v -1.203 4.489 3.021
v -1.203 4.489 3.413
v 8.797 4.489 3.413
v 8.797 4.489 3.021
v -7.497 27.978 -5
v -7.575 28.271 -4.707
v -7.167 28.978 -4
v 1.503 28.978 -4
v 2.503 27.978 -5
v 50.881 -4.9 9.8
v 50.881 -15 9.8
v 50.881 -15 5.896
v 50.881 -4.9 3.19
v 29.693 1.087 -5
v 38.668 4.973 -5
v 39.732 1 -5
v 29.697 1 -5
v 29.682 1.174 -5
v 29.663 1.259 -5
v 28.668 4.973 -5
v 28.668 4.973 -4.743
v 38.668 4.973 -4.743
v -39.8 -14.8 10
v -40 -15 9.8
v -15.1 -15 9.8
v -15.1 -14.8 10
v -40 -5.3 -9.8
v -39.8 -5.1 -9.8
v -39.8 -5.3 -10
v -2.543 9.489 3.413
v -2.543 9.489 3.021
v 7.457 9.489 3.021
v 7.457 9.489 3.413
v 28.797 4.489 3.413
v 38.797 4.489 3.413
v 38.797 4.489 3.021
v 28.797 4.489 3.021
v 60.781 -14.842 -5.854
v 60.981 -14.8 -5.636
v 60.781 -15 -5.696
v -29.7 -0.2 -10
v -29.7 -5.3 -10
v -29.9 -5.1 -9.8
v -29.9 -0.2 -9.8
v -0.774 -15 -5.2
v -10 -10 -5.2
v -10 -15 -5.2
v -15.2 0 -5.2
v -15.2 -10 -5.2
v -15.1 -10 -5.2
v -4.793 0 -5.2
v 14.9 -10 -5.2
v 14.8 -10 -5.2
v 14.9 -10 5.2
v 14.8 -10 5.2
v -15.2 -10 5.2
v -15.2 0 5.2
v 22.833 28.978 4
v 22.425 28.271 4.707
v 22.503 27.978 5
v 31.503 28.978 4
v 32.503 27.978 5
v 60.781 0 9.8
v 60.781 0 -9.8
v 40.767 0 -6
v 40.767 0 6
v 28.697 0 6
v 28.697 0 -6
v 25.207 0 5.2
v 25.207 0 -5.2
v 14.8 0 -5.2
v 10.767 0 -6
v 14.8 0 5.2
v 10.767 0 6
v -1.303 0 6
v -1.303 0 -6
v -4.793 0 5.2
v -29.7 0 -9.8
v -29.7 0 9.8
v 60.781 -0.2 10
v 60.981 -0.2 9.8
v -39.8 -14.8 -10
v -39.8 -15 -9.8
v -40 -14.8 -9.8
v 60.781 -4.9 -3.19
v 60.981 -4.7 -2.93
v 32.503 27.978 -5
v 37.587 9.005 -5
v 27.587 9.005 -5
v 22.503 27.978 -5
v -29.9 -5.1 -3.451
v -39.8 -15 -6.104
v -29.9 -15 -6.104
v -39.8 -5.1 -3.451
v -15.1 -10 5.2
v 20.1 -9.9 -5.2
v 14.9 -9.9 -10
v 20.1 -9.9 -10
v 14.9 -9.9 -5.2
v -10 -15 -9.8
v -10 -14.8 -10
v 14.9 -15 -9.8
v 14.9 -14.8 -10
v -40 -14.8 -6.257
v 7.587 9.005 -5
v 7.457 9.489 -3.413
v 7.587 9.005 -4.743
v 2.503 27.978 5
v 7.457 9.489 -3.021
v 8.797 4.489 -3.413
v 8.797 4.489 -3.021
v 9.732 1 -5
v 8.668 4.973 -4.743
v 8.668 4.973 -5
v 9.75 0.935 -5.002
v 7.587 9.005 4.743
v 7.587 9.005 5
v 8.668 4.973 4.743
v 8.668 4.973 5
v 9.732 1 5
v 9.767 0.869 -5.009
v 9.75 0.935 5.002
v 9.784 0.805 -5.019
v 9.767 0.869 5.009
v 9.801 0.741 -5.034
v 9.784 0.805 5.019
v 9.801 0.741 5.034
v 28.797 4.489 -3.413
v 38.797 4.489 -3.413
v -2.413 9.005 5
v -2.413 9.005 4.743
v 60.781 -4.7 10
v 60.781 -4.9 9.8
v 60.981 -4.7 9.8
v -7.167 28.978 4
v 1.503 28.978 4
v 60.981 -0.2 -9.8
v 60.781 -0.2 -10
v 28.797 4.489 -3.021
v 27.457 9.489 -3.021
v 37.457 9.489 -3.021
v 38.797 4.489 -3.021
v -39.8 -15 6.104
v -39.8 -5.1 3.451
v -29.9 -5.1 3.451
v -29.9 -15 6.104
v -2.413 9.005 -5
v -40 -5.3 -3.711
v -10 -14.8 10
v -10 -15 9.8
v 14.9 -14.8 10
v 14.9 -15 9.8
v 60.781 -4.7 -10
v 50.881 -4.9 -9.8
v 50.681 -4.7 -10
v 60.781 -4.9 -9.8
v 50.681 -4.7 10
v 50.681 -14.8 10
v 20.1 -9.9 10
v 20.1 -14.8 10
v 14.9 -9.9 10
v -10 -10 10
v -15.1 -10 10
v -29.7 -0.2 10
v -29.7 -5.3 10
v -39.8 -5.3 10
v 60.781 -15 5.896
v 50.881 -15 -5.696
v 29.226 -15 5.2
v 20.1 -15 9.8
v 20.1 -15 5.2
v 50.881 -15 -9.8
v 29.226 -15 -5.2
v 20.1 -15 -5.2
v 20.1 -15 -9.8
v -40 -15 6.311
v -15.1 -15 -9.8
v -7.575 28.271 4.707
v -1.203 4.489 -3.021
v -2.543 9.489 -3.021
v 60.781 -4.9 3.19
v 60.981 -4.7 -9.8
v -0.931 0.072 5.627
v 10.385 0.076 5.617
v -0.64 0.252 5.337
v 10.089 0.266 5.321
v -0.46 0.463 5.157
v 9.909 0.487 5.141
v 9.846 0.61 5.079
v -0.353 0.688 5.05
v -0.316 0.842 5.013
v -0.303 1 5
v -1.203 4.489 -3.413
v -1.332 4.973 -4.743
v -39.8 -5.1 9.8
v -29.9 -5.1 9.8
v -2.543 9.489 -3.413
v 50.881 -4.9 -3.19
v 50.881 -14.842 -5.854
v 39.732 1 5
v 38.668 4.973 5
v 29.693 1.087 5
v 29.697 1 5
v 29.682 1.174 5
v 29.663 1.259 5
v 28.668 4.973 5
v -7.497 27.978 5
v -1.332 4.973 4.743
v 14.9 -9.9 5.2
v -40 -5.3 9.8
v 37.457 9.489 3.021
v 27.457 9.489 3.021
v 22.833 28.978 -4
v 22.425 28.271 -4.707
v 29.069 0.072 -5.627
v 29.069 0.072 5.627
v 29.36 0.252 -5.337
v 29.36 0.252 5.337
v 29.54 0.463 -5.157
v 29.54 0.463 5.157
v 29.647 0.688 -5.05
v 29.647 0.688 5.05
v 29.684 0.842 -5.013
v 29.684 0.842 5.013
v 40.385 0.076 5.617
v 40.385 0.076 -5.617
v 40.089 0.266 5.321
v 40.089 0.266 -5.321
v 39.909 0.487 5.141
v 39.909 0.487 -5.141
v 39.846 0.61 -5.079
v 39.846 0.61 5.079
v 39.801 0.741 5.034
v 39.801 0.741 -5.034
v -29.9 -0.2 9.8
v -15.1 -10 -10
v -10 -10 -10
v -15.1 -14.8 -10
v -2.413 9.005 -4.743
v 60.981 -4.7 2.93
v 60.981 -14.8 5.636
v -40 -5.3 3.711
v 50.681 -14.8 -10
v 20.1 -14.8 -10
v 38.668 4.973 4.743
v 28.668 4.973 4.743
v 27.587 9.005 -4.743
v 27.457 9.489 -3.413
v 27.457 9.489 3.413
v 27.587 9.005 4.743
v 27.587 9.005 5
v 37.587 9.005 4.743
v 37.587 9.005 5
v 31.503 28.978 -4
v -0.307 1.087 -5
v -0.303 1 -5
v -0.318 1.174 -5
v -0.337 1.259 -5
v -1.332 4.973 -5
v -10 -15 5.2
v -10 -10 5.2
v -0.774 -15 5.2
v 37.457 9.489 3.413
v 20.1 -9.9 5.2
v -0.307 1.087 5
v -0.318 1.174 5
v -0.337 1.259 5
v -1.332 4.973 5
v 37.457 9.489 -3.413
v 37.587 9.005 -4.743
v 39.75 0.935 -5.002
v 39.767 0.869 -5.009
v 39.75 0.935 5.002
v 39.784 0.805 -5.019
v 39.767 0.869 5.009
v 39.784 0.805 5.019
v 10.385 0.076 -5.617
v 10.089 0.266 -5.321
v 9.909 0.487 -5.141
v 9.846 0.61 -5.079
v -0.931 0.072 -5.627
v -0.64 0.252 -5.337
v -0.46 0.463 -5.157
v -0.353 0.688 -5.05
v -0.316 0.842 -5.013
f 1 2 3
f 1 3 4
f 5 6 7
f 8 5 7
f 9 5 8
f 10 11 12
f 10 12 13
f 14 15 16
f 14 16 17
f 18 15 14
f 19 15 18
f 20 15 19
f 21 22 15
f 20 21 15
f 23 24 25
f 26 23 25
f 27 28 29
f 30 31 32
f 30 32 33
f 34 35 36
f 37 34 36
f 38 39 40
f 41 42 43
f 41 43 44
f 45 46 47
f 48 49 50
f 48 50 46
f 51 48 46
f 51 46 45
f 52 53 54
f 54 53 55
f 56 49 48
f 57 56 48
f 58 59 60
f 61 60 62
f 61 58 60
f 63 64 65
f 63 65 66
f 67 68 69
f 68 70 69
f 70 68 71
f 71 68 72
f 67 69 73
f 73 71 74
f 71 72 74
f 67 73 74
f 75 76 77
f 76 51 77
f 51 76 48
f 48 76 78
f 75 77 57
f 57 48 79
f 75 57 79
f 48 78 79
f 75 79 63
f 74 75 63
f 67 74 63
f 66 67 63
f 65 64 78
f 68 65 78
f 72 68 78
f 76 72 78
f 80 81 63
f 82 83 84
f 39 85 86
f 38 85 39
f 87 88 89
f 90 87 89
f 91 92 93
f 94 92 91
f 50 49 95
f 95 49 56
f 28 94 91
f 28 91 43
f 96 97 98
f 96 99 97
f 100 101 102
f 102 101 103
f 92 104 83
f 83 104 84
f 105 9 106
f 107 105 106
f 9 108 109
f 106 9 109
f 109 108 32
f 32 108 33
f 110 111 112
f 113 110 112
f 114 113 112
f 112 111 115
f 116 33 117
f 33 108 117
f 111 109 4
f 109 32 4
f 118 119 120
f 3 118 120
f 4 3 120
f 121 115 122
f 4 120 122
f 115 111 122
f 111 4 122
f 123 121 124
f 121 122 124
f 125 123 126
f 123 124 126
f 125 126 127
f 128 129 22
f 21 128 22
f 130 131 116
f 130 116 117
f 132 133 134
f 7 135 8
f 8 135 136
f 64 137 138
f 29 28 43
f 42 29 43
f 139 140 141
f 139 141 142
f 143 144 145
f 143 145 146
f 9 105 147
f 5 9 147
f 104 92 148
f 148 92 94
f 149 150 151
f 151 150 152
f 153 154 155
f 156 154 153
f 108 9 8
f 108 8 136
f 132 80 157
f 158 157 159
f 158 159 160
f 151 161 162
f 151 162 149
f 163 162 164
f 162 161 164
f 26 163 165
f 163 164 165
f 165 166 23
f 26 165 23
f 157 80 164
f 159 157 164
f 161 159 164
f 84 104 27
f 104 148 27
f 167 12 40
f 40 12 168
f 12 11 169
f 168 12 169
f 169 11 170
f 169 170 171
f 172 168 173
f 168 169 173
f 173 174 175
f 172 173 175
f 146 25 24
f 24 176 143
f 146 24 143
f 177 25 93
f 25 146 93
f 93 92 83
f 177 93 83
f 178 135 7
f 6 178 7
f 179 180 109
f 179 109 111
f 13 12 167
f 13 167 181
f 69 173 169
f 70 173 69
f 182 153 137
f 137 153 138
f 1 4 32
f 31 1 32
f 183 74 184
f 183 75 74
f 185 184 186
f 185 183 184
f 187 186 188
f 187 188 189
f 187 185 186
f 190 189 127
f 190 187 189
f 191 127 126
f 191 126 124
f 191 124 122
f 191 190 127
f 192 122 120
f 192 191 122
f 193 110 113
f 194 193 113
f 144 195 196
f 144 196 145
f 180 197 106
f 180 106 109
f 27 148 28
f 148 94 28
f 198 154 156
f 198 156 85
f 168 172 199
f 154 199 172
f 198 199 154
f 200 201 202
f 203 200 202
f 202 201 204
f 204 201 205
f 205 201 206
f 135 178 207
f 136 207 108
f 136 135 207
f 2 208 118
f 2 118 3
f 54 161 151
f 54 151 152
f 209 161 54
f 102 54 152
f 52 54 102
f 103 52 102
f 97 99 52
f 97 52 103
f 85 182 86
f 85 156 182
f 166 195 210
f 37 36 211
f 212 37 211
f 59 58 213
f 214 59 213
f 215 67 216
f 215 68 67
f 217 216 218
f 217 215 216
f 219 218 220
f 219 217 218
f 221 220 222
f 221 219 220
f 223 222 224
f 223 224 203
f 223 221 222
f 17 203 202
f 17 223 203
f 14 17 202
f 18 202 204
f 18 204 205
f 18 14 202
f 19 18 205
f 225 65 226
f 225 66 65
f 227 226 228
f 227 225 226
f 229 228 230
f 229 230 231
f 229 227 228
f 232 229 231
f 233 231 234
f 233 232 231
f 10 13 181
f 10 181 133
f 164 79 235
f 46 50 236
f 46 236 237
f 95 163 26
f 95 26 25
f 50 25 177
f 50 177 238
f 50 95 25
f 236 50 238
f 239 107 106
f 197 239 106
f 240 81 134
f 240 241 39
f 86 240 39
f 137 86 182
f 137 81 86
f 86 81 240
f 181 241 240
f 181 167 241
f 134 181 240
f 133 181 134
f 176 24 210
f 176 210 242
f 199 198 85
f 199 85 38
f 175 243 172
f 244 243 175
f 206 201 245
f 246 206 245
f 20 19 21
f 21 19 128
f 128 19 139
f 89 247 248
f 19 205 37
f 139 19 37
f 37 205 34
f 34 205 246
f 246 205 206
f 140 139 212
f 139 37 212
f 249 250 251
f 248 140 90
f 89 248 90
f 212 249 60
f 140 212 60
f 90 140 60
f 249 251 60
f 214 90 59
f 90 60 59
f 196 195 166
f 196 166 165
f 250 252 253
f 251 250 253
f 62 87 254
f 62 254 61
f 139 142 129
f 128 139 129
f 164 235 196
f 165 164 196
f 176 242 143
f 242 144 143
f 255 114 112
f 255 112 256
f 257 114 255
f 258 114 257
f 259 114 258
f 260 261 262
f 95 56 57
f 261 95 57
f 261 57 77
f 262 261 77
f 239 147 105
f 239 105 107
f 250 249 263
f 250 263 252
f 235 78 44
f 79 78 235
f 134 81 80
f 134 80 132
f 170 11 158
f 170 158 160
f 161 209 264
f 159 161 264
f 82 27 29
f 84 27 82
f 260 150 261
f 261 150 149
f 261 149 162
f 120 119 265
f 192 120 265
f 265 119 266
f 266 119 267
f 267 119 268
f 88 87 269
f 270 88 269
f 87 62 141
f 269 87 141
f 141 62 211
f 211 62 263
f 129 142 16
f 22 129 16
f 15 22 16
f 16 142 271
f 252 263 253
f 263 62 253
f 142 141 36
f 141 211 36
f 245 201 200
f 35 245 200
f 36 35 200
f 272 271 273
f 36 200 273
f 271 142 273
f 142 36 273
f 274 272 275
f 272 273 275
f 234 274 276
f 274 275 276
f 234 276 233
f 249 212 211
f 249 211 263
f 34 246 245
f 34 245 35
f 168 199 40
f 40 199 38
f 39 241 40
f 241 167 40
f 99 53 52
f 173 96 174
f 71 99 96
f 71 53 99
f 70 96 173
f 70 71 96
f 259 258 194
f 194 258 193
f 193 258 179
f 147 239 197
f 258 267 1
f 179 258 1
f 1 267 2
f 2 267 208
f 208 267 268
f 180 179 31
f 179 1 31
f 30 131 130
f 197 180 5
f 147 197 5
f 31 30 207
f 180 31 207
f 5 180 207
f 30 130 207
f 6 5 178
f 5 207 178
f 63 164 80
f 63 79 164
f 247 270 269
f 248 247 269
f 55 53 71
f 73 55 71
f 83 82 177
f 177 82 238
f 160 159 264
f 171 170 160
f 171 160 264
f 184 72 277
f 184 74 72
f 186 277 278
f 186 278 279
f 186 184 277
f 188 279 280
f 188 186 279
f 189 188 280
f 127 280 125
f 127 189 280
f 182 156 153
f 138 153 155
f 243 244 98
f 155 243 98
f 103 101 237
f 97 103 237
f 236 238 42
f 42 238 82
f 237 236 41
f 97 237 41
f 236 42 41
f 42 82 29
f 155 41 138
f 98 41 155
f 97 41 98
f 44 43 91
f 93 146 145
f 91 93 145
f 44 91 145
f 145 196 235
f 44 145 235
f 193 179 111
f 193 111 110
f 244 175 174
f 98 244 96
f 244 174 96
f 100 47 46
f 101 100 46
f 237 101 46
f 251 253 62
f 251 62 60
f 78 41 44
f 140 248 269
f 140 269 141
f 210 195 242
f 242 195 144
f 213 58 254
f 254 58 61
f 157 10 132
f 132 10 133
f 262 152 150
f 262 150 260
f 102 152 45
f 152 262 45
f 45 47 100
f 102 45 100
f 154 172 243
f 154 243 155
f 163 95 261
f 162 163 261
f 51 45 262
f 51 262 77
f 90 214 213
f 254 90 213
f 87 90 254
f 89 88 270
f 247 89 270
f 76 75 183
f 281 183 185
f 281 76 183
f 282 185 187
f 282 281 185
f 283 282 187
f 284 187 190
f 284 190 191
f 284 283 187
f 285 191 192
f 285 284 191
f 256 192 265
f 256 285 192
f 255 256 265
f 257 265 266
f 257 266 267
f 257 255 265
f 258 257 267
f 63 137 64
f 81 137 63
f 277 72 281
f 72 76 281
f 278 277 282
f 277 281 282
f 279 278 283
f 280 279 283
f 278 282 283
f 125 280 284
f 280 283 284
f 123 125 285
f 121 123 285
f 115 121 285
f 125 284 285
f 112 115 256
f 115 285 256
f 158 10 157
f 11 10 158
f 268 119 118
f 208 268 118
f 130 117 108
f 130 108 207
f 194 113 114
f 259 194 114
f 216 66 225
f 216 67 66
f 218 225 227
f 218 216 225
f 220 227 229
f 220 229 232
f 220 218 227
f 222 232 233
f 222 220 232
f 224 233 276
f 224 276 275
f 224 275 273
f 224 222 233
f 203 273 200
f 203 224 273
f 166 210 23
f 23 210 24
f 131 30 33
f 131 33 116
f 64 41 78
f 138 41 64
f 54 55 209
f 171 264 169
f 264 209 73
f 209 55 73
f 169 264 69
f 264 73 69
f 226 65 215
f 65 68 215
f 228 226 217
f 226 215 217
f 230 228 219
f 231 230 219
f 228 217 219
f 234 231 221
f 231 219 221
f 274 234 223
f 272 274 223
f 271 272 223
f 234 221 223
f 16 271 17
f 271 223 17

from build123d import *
from OCP.BRepFilletAPI import BRepFilletAPI_MakeChamfer

# Parameters (mm, degrees)
SKETCH2_W                     = 80
SKETCH2_H                     = 20
BOSS_EXTRUDE1_DEPTH           = 15
BOSS_EXTRUDE2_DEPTH           = 5
CUT_EXTRUDE1_DEPTH            = 5
SKETCH6_W                     = 5
SKETCH6_H                     = 5
CUT_EXTRUDE2_DEPTH            = 51.395549721
SLOT_EXTRUDE_DEPTH            = 51.395549721
SKETCH10_W                    = 5
SKETCH10_H                    = 10
CUT_EXTRUDE8_DEPTH            = 5
BOSS_EXTRUDE3_DEPTH           = 20.980762114
FILLET1_R                     = 1
CHAMFER1_SIZE                 = 1
CHAMFER2_SIZE                 = 0.73205
CHAMFER2_SIZE2                = 0.597716322
CHAMFER2_SIZE2_2              = 1.035275038
LPATTERN1_COUNT               = 2
LPATTERN1_PITCH               = 30
FILLET1_OF_LPATTERN1_R        = 1
CHAMFER1_OF_LPATTERN1_SIZE    = 1
CHAMFER2_OF_LPATTERN1_SIZE    = 0.73205
CHAMFER2_OF_LPATTERN1_SIZE2   = 0.597716322
CHAMFER2_OF_LPATTERN1_SIZE2_2 = 1.035275038
BOSS_EXTRUDE4_DEPTH           = 10.980762114
CUT_EXTRUDE9_START            = -80
CUT_EXTRUDE9_DEPTH            = 10
MOVE_START                    = -5.2
MOVE_FACE1_DEPTH              = 10.4
MOVE_START_2                  = -10
MOVE_FACE1_2_OUTLINE_W        = 0.2
MOVE_FACE1_2_OUTLINE_H        = 5
MOVE_FACE1_2_DEPTH            = 20
MOVE_START_3                  = -40
MOVE_FACE2_DEPTH              = 10.1
MOVE_START_4                  = 50.880762114
MOVE_FACE2_2_DEPTH            = 10.1
BOSS_EXTRUDE5_DEPTH           = 0.1
MOVE_FACE3_BY                 = 0.1
MOVE_FACE3_2_BY               = 0.1
MOVE_FACE3_3_BY               = 0.1
MOVE_FACE3_4_BY               = 0.1
BOSS_EXTRUDE6_DEPTH           = 0.1
MOVE_START_5                  = -2.542539714
MOVE_FACE5_DEPTH              = 41.339745962
CHAMFER3_SIZE                 = 0.2
CHAMFER3_SIZE2                = 0.163299316


# Read off the part's stored shape, not the designer's step: Move Face1, Move Face2, Move Face5
with BuildPart() as part:
    # Sketch2 → Boss-Extrude1 (new body)
    with BuildSketch(Plane(origin=(0, 0, 0), x_dir=(1, 0, 0), z_dir=(0, 1, 0))):
        Rectangle(SKETCH2_W, SKETCH2_H)
    extrude(amount=-BOSS_EXTRUDE1_DEPTH)

    # Sketch3 → Boss-Extrude2 (add, symmetric)
    with BuildSketch(Plane.XY):
        Polygon((40, 0), (30, 0), (22.235428647, 28.977774789), (32.235428647, 28.977774789), align=None)
    boss_extrude2 = extrude(amount=BOSS_EXTRUDE2_DEPTH, both=True)

    # Sketch4 → Cut-Extrude1 (cut, symmetric)
    with BuildSketch(Plane.XY):
        Polygon((19.019237886, -15), (29.019237886, -15), (25, 0), (15, 0), align=None)
    cut_extrude1 = extrude(amount=CUT_EXTRUDE1_DEPTH, both=True, mode=Mode.SUBTRACT)

    # Sketch6 → Cut-Extrude2 (cut, symmetric)
    with BuildSketch(Plane.XY):
        with Locations((17.5, -12.5)):
            Rectangle(SKETCH6_W, SKETCH6_H)
    cut_extrude2 = extrude(amount=CUT_EXTRUDE2_DEPTH, both=True, mode=Mode.SUBTRACT)

    # Sketch8 → Slot Extrude (cut, symmetric)
    with BuildSketch(Plane(origin=(0, 0, 0), x_dir=(0, 0, -1), z_dir=(1, 0, 0))):
        Polygon((-4.725252258, 8.904847108), (-5, 8.804847108), (-5, 6.988887394), (-3.120614758, 6.988887394), (-3.120614758, 9.388887394), (-3.3953625, 9.388887394), align=None)
        Polygon((-3.120614758, 6.988887394), (-5, 6.988887394), (-5, 5.172927681), (-4.725252258, 5.072927681), (-3.3953625, 4.588887394), (-3.120614758, 4.588887394), align=None)
        Polygon((5, 5.172927681), (5, 8.804847108), (4.725252258, 8.904847108), (3.3953625, 9.388887394), (3.120614758, 9.388887394), (3.120614758, 4.588887394), (3.3953625, 4.588887394), (4.725252258, 5.072927681), align=None)
        Polygon((4.725252258, 8.904847108), (5, 8.804847108), (5, 8.904847108), align=None)
        Polygon((5, 5.072927681), (5, 5.172927681), (4.725252258, 5.072927681), align=None)
        Polygon((-5, 8.904847108), (-5, 8.804847108), (-4.725252258, 8.904847108), align=None)
        Polygon((-4.725252258, 5.072927681), (-5, 5.172927681), (-5, 5.072927681), align=None)
    slot_extrude = extrude(amount=SLOT_EXTRUDE_DEPTH, both=True, mode=Mode.SUBTRACT)

    # Sketch10 → Cut-Extrude8 (cut, symmetric)
    with BuildSketch(Plane.XY):
        with Locations((17.5, -5)):
            Rectangle(SKETCH10_W, SKETCH10_H)
    cut_extrude8 = extrude(amount=CUT_EXTRUDE8_DEPTH, both=True, mode=Mode.SUBTRACT)

    # Sketch12 → Boss-Extrude3 (add)
    with BuildSketch(Plane(origin=(40, 0, 0), x_dir=(0, 0, -1), z_dir=(1, 0, 0))):
        Polygon((6, -15), (3.320508076, -5), (-3.320508076, -5), (-6, -15), (0, -15), align=None)
        Polygon((10, -5), (10, 0), (5, 0), (-5, 0), (-10, 0), (-10, -5), (-3.320508076, -5), (3.320508076, -5), align=None)
    extrude(amount=BOSS_EXTRUDE3_DEPTH)

    # Fillet1
    fillet1_edges = [part.edges().sort_by_distance(p)[0] for p in [
        (30, 0, 0),
        (40, 0, 0),
        (35, 0, -5),
        (35, 0, 5),
    ]]
    fillet(fillet1_edges, radius=FILLET1_R)

    # Chamfer1
    chamfer1_edges = [part.edges().sort_by_distance(p)[0] for p in [
        (27.235428647, 28.977774789, -5),
        (27.235428647, 28.977774789, 5),
    ]]
    chamfer(chamfer1_edges, length=CHAMFER1_SIZE)

    # Chamfer2: one chamfer whose edges measure the first distance from different faces: ONE call of the kernel's chamfer builder (chamfer() names one face for all edges)
    chamfer2_edges_1 = [part.edges().sort_by_distance(p)[0] for p in [
        (22.235428647, 28.977774789, 0),
    ]]
    chamfer2_side_1 = [part.faces().sort_by_distance(p)[0] for p in [
        (25.827075596, 15.57356589, 0),
    ]]
    chamfer2_edges_2 = [part.edges().sort_by_distance(p)[0] for p in [
        (32.235428647, 28.977774789, 0),
    ]]
    chamfer2_side_2 = [part.faces().sort_by_distance(p)[0] for p in [
        (27.235428647, 28.977774789, 0),
    ]]
    chamfer2 = BRepFilletAPI_MakeChamfer(part.part.solid().wrapped)
    for e in chamfer2_edges_1:
        chamfer2.Add(CHAMFER2_SIZE, CHAMFER2_SIZE2, e.wrapped, chamfer2_side_1[0].wrapped)  # the first distance lies on this face
    for e in chamfer2_edges_2:
        chamfer2.Add(CHAMFER2_SIZE, CHAMFER2_SIZE2_2, e.wrapped, chamfer2_side_2[0].wrapped)  # the first distance lies on this face
    add(Compound.cast(chamfer2.Shape()), mode=Mode.REPLACE)

    # LPattern1: Boss-Extrude2, Cut-Extrude1, Cut-Extrude2, Slot Extrude, Cut-Extrude8 ×2
    with Locations(*[(-i * LPATTERN1_PITCH, 0, 0) for i in range(1, LPATTERN1_COUNT)]):
        add(boss_extrude2)
        add(cut_extrude1, mode=Mode.SUBTRACT)
        add(cut_extrude2, mode=Mode.SUBTRACT)
        add(slot_extrude, mode=Mode.SUBTRACT)
        add(cut_extrude8, mode=Mode.SUBTRACT)

    # Fillet1 of LPattern1
    fillet1_of_lpattern1_edges = [part.edges().sort_by_distance(p)[0] for p in [
        (0, 0, 0),
        (10, 0, 0),
        (5, 0, -5),
        (5, 0, 5),
    ]]
    fillet(fillet1_of_lpattern1_edges, radius=FILLET1_OF_LPATTERN1_R)

    # Chamfer1 of LPattern1
    chamfer1_of_lpattern1_edges = [part.edges().sort_by_distance(p)[0] for p in [
        (-2.764571353, 28.977774789, -5),
        (-2.764571353, 28.977774789, 5),
    ]]
    chamfer(chamfer1_of_lpattern1_edges, length=CHAMFER1_OF_LPATTERN1_SIZE)

    # Chamfer2 of LPattern1: one chamfer whose edges measure the first distance from different faces: ONE call of the kernel's chamfer builder (chamfer() names one face for all edges)
    chamfer2_of_lpattern1_edges_1 = [part.edges().sort_by_distance(p)[0] for p in [
        (-7.764571353, 28.977774789, 0),
    ]]
    chamfer2_of_lpattern1_side_1 = [part.faces().sort_by_distance(p)[0] for p in [
        (-4.172924404, 15.57356589, 0),
    ]]
    chamfer2_of_lpattern1_edges_2 = [part.edges().sort_by_distance(p)[0] for p in [
        (2.235428647, 28.977774789, 0),
    ]]
    chamfer2_of_lpattern1_side_2 = [part.faces().sort_by_distance(p)[0] for p in [
        (-2.764571353, 28.977774789, 0),
    ]]
    chamfer2_of_lpattern1 = BRepFilletAPI_MakeChamfer(part.part.solid().wrapped)
    for e in chamfer2_of_lpattern1_edges_1:
        chamfer2_of_lpattern1.Add(CHAMFER2_OF_LPATTERN1_SIZE, CHAMFER2_OF_LPATTERN1_SIZE2, e.wrapped, chamfer2_of_lpattern1_side_1[0].wrapped)  # the first distance lies on this face
    for e in chamfer2_of_lpattern1_edges_2:
        chamfer2_of_lpattern1.Add(CHAMFER2_OF_LPATTERN1_SIZE, CHAMFER2_OF_LPATTERN1_SIZE2_2, e.wrapped, chamfer2_of_lpattern1_side_2[0].wrapped)  # the first distance lies on this face
    add(Compound.cast(chamfer2_of_lpattern1.Shape()), mode=Mode.REPLACE)

    # Sketch12<5> → Boss-Extrude4 (add)
    with BuildSketch(Plane(origin=(40, 0, 0), x_dir=(0, 0, -1), z_dir=(1, 0, 0))):
        Polygon((10, -15), (10, -5), (3.320508076, -5), (6, -15), align=None)
        Polygon((-6, -15), (-3.320508076, -5), (-10, -5), (-10, -15), align=None)
    extrude(amount=BOSS_EXTRUDE4_DEPTH)

    # Sketch12<6> → Cut-Extrude9 (cut)
    with BuildSketch(Plane(origin=(40, 0, 0), x_dir=(0, 0, -1), z_dir=(1, 0, 0)).offset(CUT_EXTRUDE9_START)):
        Polygon((6, -15), (3.320508076, -5), (-3.320508076, -5), (-6, -15), (0, -15), align=None)
        Polygon((10, -5), (10, 0), (5, 0), (-5, 0), (-10, 0), (-10, -5), (-3.320508076, -5), (3.320508076, -5), align=None)
    extrude(amount=CUT_EXTRUDE9_DEPTH, mode=Mode.SUBTRACT)

    # Move Face1 outline → Move Face1 (cut)
    with BuildSketch(Plane.XY.offset(MOVE_START)):
        Polygon((29.226293123, -15), (25.207055236, 0), (14.8, 0), (14.8, -15), (15, -15), (15, -10), (20, -10), (20, -15), align=None)
        Polygon((-0.773706877, -15), (-4.792944764, 0), (-15.2, 0), (-15.2, -15), (-15, -15), (-15, -10), (-10, -10), (-10, -15), align=None)
    extrude(amount=MOVE_FACE1_DEPTH, mode=Mode.SUBTRACT)

    # Move Face1 2 outline → Move Face1 2 (cut)
    with BuildSketch(Plane.XY.offset(MOVE_START_2)):
        with Locations((14.9, -12.5)):
            Rectangle(MOVE_FACE1_2_OUTLINE_W, MOVE_FACE1_2_OUTLINE_H)
        with Locations((-15.1, -12.5)):
            Rectangle(MOVE_FACE1_2_OUTLINE_W, MOVE_FACE1_2_OUTLINE_H)
    extrude(amount=MOVE_FACE1_2_DEPTH, mode=Mode.SUBTRACT)

    # Move Face2 outline → Move Face2 (cut)
    with BuildSketch(Plane.YZ.offset(MOVE_START_3)):
        Polygon((-15, -6.103527618), (-5.1, -3.450830613), (-5.1, -10), (0, -10), (0, 10), (-5.1, 10), (-5.1, 3.450830613), (-15, 6.103527618), align=None)
    extrude(amount=MOVE_FACE2_DEPTH, mode=Mode.SUBTRACT)

    # Move Face2 2 outline → Move Face2 2 (cut)
    with BuildSketch(Plane.YZ.offset(MOVE_START_4)):
        Polygon((-4.9, -3.190185538), (-15, -5.896472382), (-15, -10), (-4.9, -10), align=None)
        Polygon((-15, 5.896472382), (-4.9, 3.190185538), (-4.9, 10), (-15, 10), align=None)
    extrude(amount=MOVE_FACE2_2_DEPTH, mode=Mode.SUBTRACT)

    # Sketch13 → Boss-Extrude5 (add)
    with BuildSketch(Plane(origin=(14.8, 0, 0), x_dir=(0, 0, -1), z_dir=(1, 0, 0))):
        Polygon((5.2, -10), (-5.2, -10), (-10, -10), (-10, -15), (10, -15), (10, -10), align=None)
    extrude(amount=BOSS_EXTRUDE5_DEPTH)

    # Move Face3: a face moved inward by 0.1
    extrude(part.faces().sort_by_distance((17.45, -10, 7.6))[0], amount=MOVE_FACE3_BY, dir=(0, 1, 0), mode=Mode.SUBTRACT)

    # Move Face3 2: a face moved inward by 0.1
    extrude(part.faces().sort_by_distance((20, -12.5, 7.6))[0], amount=MOVE_FACE3_2_BY, dir=(1, 0, 0), mode=Mode.SUBTRACT)

    # Move Face3 3: a face moved inward by 0.1
    extrude(part.faces().sort_by_distance((20, -12.5, -7.6))[0], amount=MOVE_FACE3_3_BY, dir=(1, 0, 0), mode=Mode.SUBTRACT)

    # Move Face3 4: a face moved inward by 0.1
    extrude(part.faces().sort_by_distance((17.45, -10, -7.6))[0], amount=MOVE_FACE3_4_BY, dir=(0, 1, 0), mode=Mode.SUBTRACT)

    # Sketch16 → Boss-Extrude6 (add)
    with BuildSketch(Plane(origin=(-15.2, 0, 0), x_dir=(0, 0, -1), z_dir=(1, 0, 0))):
        Polygon((5.2, -10), (-5.2, -10), (-10, -10), (-10, -15), (10, -15), (10, -10), align=None)
    extrude(amount=BOSS_EXTRUDE6_DEPTH)

    # Move Face5 outline → Move Face5 (cut)
    with BuildSketch(Plane.YZ.offset(MOVE_START_5)):
        Polygon((9.004847108, 4.742884956), (9.004847108, 5), (8.904847108, 5), (8.904847108, 4.725252258), (9.388887394, 3.3953625), (9.388887394, 3.120614758), (4.588887394, 3.120614758), (4.588887394, 3.3953625), (5.072927681, 4.725252258), (5.072927681, 5), (4.972927681, 5), (4.972927681, 4.742884956), (4.488887394, 3.412995198), (4.488887394, 3.020614758), (9.488887394, 3.020614758), (9.488887394, 3.412995198), align=None)
        Polygon((8.904847108, -5), (9.004847108, -5), (9.004847108, -4.742884956), (9.488887394, -3.412995198), (9.488887394, -3.020614758), (4.488887394, -3.020614758), (4.488887394, -3.412995198), (4.972927681, -4.742884956), (4.972927681, -5), (5.072927681, -5), (5.072927681, -4.725252258), (4.588887394, -3.3953625), (4.588887394, -3.120614758), (9.388887394, -3.120614758), (9.388887394, -3.3953625), (8.904847108, -4.725252258), align=None)
    extrude(amount=MOVE_FACE5_DEPTH, mode=Mode.SUBTRACT)

    # Chamfer3: one chamfer whose edges measure the first distance from different faces: ONE call of the kernel's chamfer builder (chamfer() names one face for all edges)
    chamfer3_edges_1 = [part.edges().sort_by_distance(p)[0] for p in [
        (35.490381057, -15, -10),
        (60.980762114, -9.95, -4.54332896),
        (60.980762114, -4.9, -6.595092769),
        (55.930762114, -4.9, -10),
        (60.980762114, -4.9, 6.595092769),
        (55.930762114, -4.9, 10),
        (60.980762114, -2.45, -10),
        (60.980762114, 0, 0),
        (60.980762114, -2.45, 10),
        (60.980762114, -9.95, 4.54332896),
        (60.980762114, -15, 0),
        (2.45, -15, 10),
        (-27.55, -15, -10),
        (2.45, -15, -10),
        (35.490381057, -15, 10),
        (-40, -15, -8.051763809),
        (15.540381057, 0, -10),
        (50.880762114, -9.95, 10),
        (50.880762114, -9.95, -10),
        (15.540381057, 0, 10),
        (-40, -5.1, 6.725415307),
        (-34.95, -5.1, 10),
        (-40, -10.05, -4.777179116),
        (-40, -5.1, -6.725415307),
        (-29.9, -2.55, -10),
        (-34.95, -5.1, -10),
        (-29.9, 0, 0),
        (-29.9, -2.55, 10),
        (-40, -10.05, 4.777179116),
        (-40, -10.05, -10),
        (-40, -10.05, 10),
        (-27.55, -15, 10),
    ]]
    chamfer3_edges_2 = [part.edges().sort_by_distance(p)[0] for p in [
        (55.930762114, -15, -5.896472382),
    ]]
    chamfer3_side_2 = [part.faces().sort_by_distance(p)[0] for p in [
        (40.901792788, -15, 0),
    ]]
    chamfer3 = BRepFilletAPI_MakeChamfer(part.part.solid().wrapped)
    for e in chamfer3_edges_1:
        chamfer3.Add(CHAMFER3_SIZE, e.wrapped)
    for e in chamfer3_edges_2:
        chamfer3.Add(CHAMFER3_SIZE, CHAMFER3_SIZE2, e.wrapped, chamfer3_side_2[0].wrapped)  # the first distance lies on this face
    add(Compound.cast(chamfer3.Shape()), mode=Mode.REPLACE)


solid = part.part
